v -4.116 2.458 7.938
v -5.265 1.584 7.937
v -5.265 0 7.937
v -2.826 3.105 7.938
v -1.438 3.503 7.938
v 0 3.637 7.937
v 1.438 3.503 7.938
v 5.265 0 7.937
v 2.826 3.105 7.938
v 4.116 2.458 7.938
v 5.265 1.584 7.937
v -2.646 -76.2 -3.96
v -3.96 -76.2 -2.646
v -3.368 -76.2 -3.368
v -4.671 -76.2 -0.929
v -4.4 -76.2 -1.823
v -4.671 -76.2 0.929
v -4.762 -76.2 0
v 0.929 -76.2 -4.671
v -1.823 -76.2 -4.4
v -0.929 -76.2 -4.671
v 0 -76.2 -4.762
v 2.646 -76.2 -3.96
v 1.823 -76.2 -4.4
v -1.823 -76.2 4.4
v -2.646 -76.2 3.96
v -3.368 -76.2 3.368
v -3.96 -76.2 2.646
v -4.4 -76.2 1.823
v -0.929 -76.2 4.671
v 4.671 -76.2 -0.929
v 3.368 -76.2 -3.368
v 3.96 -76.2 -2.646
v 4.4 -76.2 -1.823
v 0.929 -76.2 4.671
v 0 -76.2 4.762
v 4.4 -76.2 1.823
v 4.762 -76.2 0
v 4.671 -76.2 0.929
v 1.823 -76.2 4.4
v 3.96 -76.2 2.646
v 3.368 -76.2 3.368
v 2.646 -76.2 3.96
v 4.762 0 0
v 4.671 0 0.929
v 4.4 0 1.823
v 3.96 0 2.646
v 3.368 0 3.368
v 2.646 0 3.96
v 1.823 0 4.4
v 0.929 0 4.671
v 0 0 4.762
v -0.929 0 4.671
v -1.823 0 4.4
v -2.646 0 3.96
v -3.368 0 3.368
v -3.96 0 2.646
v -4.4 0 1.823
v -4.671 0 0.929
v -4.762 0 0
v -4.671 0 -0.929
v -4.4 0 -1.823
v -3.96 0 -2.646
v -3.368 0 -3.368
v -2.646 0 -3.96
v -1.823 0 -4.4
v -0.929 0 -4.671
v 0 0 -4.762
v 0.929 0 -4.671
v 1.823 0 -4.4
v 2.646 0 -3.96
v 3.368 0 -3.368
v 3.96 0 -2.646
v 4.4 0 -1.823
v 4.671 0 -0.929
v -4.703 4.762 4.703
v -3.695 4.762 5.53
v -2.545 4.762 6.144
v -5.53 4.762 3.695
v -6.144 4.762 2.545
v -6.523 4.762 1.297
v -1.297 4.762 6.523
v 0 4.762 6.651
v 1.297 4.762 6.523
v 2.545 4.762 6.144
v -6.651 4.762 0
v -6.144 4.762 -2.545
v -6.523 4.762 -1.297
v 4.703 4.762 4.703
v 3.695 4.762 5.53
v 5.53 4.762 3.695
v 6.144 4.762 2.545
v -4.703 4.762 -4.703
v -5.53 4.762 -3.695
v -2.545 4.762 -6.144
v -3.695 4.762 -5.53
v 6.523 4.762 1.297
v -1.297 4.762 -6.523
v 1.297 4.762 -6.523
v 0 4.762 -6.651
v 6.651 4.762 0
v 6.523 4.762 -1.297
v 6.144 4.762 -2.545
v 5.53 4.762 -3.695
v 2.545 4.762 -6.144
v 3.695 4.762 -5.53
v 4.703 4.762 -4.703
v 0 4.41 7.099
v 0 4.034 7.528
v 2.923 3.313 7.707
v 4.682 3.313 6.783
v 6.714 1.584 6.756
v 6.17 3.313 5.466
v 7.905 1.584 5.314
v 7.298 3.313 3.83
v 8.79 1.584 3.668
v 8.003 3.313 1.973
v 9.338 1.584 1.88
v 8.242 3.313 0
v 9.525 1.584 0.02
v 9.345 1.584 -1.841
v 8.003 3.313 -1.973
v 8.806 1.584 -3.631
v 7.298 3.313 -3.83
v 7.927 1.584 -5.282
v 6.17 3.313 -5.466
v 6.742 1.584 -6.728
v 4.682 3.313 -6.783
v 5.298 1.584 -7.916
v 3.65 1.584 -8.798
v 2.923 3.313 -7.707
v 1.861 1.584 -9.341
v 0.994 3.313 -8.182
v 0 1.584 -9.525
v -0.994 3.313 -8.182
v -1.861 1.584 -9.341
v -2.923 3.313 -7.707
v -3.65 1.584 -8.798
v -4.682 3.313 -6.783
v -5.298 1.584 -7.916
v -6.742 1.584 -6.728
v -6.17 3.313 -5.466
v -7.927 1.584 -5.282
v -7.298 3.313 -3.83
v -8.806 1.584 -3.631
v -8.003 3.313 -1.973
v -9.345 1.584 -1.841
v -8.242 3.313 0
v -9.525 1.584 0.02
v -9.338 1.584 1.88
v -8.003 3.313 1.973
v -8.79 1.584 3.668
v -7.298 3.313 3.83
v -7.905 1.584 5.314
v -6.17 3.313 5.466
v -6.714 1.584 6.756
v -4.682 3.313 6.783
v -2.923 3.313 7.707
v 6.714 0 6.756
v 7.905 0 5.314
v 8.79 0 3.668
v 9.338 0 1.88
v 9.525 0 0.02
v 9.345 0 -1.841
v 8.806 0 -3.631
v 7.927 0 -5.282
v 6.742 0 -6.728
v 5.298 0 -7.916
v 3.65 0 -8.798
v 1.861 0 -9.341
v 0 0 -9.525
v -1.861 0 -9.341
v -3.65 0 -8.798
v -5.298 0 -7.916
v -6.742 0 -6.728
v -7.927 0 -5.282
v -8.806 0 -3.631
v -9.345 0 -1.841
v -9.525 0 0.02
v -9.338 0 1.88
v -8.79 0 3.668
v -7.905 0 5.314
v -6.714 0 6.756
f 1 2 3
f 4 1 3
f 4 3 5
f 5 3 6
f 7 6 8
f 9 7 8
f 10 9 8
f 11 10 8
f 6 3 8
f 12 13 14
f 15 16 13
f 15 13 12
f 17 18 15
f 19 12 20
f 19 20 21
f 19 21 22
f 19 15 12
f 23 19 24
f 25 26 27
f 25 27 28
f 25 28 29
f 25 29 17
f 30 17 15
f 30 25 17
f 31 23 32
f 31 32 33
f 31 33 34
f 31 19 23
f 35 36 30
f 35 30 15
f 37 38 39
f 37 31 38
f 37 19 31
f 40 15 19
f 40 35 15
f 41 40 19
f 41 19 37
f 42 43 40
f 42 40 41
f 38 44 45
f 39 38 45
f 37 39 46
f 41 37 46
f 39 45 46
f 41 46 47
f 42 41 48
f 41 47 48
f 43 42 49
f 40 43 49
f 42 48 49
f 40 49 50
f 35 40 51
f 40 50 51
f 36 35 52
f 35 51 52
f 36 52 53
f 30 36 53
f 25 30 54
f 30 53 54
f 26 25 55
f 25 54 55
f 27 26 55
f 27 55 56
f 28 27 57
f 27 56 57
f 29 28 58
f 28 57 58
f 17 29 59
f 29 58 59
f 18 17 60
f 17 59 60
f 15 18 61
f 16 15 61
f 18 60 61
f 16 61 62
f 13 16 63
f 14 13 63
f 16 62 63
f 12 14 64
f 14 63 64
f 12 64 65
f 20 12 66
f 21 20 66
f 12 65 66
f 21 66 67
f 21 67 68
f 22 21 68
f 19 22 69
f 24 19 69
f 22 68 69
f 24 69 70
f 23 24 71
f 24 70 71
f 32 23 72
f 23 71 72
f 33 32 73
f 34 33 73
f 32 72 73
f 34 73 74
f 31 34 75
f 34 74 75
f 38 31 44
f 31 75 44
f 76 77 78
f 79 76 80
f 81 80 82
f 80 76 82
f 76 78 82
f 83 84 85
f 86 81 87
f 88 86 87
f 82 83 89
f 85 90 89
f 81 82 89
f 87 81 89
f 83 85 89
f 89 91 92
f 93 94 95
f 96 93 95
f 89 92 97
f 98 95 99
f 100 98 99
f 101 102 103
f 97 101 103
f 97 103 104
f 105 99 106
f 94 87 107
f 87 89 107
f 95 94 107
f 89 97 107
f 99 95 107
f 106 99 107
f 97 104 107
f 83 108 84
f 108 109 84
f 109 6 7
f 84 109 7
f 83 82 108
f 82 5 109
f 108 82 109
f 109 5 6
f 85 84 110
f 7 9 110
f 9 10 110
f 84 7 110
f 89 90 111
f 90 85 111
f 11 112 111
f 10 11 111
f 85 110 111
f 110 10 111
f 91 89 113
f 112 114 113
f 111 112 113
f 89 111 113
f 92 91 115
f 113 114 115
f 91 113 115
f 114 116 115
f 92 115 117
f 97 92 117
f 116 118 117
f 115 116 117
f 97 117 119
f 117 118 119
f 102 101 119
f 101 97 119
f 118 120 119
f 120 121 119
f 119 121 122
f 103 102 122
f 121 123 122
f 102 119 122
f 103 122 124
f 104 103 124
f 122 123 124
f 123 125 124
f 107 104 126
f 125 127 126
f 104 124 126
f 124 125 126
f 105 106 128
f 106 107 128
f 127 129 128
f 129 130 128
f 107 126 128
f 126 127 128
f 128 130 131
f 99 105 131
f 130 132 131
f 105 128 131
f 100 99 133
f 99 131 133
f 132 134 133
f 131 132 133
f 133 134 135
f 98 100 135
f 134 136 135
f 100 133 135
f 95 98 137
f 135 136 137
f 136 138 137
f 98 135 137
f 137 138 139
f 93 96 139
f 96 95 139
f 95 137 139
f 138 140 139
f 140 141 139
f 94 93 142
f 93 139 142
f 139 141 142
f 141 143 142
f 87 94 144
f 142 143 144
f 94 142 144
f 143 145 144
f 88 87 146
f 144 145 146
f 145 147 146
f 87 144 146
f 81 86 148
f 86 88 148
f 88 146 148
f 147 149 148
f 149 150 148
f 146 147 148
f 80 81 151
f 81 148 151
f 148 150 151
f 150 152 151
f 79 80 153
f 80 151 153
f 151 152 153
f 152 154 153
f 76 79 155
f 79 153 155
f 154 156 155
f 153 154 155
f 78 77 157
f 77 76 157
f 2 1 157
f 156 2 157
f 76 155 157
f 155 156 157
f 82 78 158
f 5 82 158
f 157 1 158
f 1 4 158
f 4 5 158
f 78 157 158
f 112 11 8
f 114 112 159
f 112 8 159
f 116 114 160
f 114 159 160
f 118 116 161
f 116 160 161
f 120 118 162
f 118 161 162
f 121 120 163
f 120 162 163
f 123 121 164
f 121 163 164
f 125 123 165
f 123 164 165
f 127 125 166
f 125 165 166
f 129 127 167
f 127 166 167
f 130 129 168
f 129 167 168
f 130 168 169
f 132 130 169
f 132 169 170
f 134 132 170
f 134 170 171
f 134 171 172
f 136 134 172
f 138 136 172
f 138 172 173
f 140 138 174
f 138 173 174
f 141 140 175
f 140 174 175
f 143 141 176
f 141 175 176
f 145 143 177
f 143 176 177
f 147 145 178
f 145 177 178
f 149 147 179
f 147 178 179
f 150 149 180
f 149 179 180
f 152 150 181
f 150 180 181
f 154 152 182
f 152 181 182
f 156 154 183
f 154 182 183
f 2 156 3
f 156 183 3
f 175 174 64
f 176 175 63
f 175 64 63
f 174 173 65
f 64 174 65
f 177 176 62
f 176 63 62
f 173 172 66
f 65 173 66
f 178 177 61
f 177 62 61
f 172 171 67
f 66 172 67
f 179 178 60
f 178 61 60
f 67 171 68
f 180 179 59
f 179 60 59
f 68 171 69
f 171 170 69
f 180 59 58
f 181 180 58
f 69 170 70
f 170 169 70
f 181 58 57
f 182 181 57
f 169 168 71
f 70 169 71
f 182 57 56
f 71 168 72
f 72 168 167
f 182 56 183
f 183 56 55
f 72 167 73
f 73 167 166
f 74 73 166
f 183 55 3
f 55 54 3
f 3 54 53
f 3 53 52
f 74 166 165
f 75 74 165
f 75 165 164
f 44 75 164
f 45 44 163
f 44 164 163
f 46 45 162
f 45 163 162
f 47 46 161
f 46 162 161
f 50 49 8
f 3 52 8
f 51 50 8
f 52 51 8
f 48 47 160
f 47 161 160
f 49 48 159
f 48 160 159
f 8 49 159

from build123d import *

# Parameters (mm, degrees)
F0_R          = 4.7625
F1_DEPTH      = 76.2
F5_DEPTH      = 25.4
F5_DEPTH_BACK = 25.4
F7_DEPTH      = 25.4


with BuildPart() as f1:
    # F0 (on Front) → F1 (new body)
    with BuildSketch(Plane.XZ):
        Circle(F0_R)
    extrude(amount=F1_DEPTH)

    # F2 (on Right) → F3 (revolve)
    with BuildSketch(Plane.YZ):
        with BuildLine():
            Line((0, 9.525), (0, 0))
            Line((0, 0), (6.9723, 0))
            ThreePointArc((6.9723, 0), (5.5317575144, 5.4718273081), (1.5836126498, 9.525))
            Line((1.5836126498, 9.525), (0, 9.525))
        make_face()
    revolve(axis=Axis((0, 3.48615, 0), (0, 1, 0)))

    # F4 (on Right) → F5 (cut, two sides)
    with BuildSketch(Plane.YZ) as f5_sk:
        Polygon((4.7625, 7.9903732985), (4.7625, 0), (4.7625, -11.3777695224), (8.8222939521, -11.3777695224), (8.8222939521, 7.9903732985), align=None)
    extrude(amount=-F5_DEPTH, mode=Mode.SUBTRACT)
    extrude(f5_sk.sketch, amount=F5_DEPTH_BACK, mode=Mode.SUBTRACT)

    # F6 (on Front) → F7 (cut)
    with BuildSketch(Plane.XZ):
        Polygon((-8.7503455579, 7.9375), (0, 7.9375), (10.3095453233, 7.9375), (10.3095453233, 11.5658193827), (-8.7503455579, 11.5658193827), align=None)
    extrude(amount=-F7_DEPTH, mode=Mode.SUBTRACT)


solid = f1.part
